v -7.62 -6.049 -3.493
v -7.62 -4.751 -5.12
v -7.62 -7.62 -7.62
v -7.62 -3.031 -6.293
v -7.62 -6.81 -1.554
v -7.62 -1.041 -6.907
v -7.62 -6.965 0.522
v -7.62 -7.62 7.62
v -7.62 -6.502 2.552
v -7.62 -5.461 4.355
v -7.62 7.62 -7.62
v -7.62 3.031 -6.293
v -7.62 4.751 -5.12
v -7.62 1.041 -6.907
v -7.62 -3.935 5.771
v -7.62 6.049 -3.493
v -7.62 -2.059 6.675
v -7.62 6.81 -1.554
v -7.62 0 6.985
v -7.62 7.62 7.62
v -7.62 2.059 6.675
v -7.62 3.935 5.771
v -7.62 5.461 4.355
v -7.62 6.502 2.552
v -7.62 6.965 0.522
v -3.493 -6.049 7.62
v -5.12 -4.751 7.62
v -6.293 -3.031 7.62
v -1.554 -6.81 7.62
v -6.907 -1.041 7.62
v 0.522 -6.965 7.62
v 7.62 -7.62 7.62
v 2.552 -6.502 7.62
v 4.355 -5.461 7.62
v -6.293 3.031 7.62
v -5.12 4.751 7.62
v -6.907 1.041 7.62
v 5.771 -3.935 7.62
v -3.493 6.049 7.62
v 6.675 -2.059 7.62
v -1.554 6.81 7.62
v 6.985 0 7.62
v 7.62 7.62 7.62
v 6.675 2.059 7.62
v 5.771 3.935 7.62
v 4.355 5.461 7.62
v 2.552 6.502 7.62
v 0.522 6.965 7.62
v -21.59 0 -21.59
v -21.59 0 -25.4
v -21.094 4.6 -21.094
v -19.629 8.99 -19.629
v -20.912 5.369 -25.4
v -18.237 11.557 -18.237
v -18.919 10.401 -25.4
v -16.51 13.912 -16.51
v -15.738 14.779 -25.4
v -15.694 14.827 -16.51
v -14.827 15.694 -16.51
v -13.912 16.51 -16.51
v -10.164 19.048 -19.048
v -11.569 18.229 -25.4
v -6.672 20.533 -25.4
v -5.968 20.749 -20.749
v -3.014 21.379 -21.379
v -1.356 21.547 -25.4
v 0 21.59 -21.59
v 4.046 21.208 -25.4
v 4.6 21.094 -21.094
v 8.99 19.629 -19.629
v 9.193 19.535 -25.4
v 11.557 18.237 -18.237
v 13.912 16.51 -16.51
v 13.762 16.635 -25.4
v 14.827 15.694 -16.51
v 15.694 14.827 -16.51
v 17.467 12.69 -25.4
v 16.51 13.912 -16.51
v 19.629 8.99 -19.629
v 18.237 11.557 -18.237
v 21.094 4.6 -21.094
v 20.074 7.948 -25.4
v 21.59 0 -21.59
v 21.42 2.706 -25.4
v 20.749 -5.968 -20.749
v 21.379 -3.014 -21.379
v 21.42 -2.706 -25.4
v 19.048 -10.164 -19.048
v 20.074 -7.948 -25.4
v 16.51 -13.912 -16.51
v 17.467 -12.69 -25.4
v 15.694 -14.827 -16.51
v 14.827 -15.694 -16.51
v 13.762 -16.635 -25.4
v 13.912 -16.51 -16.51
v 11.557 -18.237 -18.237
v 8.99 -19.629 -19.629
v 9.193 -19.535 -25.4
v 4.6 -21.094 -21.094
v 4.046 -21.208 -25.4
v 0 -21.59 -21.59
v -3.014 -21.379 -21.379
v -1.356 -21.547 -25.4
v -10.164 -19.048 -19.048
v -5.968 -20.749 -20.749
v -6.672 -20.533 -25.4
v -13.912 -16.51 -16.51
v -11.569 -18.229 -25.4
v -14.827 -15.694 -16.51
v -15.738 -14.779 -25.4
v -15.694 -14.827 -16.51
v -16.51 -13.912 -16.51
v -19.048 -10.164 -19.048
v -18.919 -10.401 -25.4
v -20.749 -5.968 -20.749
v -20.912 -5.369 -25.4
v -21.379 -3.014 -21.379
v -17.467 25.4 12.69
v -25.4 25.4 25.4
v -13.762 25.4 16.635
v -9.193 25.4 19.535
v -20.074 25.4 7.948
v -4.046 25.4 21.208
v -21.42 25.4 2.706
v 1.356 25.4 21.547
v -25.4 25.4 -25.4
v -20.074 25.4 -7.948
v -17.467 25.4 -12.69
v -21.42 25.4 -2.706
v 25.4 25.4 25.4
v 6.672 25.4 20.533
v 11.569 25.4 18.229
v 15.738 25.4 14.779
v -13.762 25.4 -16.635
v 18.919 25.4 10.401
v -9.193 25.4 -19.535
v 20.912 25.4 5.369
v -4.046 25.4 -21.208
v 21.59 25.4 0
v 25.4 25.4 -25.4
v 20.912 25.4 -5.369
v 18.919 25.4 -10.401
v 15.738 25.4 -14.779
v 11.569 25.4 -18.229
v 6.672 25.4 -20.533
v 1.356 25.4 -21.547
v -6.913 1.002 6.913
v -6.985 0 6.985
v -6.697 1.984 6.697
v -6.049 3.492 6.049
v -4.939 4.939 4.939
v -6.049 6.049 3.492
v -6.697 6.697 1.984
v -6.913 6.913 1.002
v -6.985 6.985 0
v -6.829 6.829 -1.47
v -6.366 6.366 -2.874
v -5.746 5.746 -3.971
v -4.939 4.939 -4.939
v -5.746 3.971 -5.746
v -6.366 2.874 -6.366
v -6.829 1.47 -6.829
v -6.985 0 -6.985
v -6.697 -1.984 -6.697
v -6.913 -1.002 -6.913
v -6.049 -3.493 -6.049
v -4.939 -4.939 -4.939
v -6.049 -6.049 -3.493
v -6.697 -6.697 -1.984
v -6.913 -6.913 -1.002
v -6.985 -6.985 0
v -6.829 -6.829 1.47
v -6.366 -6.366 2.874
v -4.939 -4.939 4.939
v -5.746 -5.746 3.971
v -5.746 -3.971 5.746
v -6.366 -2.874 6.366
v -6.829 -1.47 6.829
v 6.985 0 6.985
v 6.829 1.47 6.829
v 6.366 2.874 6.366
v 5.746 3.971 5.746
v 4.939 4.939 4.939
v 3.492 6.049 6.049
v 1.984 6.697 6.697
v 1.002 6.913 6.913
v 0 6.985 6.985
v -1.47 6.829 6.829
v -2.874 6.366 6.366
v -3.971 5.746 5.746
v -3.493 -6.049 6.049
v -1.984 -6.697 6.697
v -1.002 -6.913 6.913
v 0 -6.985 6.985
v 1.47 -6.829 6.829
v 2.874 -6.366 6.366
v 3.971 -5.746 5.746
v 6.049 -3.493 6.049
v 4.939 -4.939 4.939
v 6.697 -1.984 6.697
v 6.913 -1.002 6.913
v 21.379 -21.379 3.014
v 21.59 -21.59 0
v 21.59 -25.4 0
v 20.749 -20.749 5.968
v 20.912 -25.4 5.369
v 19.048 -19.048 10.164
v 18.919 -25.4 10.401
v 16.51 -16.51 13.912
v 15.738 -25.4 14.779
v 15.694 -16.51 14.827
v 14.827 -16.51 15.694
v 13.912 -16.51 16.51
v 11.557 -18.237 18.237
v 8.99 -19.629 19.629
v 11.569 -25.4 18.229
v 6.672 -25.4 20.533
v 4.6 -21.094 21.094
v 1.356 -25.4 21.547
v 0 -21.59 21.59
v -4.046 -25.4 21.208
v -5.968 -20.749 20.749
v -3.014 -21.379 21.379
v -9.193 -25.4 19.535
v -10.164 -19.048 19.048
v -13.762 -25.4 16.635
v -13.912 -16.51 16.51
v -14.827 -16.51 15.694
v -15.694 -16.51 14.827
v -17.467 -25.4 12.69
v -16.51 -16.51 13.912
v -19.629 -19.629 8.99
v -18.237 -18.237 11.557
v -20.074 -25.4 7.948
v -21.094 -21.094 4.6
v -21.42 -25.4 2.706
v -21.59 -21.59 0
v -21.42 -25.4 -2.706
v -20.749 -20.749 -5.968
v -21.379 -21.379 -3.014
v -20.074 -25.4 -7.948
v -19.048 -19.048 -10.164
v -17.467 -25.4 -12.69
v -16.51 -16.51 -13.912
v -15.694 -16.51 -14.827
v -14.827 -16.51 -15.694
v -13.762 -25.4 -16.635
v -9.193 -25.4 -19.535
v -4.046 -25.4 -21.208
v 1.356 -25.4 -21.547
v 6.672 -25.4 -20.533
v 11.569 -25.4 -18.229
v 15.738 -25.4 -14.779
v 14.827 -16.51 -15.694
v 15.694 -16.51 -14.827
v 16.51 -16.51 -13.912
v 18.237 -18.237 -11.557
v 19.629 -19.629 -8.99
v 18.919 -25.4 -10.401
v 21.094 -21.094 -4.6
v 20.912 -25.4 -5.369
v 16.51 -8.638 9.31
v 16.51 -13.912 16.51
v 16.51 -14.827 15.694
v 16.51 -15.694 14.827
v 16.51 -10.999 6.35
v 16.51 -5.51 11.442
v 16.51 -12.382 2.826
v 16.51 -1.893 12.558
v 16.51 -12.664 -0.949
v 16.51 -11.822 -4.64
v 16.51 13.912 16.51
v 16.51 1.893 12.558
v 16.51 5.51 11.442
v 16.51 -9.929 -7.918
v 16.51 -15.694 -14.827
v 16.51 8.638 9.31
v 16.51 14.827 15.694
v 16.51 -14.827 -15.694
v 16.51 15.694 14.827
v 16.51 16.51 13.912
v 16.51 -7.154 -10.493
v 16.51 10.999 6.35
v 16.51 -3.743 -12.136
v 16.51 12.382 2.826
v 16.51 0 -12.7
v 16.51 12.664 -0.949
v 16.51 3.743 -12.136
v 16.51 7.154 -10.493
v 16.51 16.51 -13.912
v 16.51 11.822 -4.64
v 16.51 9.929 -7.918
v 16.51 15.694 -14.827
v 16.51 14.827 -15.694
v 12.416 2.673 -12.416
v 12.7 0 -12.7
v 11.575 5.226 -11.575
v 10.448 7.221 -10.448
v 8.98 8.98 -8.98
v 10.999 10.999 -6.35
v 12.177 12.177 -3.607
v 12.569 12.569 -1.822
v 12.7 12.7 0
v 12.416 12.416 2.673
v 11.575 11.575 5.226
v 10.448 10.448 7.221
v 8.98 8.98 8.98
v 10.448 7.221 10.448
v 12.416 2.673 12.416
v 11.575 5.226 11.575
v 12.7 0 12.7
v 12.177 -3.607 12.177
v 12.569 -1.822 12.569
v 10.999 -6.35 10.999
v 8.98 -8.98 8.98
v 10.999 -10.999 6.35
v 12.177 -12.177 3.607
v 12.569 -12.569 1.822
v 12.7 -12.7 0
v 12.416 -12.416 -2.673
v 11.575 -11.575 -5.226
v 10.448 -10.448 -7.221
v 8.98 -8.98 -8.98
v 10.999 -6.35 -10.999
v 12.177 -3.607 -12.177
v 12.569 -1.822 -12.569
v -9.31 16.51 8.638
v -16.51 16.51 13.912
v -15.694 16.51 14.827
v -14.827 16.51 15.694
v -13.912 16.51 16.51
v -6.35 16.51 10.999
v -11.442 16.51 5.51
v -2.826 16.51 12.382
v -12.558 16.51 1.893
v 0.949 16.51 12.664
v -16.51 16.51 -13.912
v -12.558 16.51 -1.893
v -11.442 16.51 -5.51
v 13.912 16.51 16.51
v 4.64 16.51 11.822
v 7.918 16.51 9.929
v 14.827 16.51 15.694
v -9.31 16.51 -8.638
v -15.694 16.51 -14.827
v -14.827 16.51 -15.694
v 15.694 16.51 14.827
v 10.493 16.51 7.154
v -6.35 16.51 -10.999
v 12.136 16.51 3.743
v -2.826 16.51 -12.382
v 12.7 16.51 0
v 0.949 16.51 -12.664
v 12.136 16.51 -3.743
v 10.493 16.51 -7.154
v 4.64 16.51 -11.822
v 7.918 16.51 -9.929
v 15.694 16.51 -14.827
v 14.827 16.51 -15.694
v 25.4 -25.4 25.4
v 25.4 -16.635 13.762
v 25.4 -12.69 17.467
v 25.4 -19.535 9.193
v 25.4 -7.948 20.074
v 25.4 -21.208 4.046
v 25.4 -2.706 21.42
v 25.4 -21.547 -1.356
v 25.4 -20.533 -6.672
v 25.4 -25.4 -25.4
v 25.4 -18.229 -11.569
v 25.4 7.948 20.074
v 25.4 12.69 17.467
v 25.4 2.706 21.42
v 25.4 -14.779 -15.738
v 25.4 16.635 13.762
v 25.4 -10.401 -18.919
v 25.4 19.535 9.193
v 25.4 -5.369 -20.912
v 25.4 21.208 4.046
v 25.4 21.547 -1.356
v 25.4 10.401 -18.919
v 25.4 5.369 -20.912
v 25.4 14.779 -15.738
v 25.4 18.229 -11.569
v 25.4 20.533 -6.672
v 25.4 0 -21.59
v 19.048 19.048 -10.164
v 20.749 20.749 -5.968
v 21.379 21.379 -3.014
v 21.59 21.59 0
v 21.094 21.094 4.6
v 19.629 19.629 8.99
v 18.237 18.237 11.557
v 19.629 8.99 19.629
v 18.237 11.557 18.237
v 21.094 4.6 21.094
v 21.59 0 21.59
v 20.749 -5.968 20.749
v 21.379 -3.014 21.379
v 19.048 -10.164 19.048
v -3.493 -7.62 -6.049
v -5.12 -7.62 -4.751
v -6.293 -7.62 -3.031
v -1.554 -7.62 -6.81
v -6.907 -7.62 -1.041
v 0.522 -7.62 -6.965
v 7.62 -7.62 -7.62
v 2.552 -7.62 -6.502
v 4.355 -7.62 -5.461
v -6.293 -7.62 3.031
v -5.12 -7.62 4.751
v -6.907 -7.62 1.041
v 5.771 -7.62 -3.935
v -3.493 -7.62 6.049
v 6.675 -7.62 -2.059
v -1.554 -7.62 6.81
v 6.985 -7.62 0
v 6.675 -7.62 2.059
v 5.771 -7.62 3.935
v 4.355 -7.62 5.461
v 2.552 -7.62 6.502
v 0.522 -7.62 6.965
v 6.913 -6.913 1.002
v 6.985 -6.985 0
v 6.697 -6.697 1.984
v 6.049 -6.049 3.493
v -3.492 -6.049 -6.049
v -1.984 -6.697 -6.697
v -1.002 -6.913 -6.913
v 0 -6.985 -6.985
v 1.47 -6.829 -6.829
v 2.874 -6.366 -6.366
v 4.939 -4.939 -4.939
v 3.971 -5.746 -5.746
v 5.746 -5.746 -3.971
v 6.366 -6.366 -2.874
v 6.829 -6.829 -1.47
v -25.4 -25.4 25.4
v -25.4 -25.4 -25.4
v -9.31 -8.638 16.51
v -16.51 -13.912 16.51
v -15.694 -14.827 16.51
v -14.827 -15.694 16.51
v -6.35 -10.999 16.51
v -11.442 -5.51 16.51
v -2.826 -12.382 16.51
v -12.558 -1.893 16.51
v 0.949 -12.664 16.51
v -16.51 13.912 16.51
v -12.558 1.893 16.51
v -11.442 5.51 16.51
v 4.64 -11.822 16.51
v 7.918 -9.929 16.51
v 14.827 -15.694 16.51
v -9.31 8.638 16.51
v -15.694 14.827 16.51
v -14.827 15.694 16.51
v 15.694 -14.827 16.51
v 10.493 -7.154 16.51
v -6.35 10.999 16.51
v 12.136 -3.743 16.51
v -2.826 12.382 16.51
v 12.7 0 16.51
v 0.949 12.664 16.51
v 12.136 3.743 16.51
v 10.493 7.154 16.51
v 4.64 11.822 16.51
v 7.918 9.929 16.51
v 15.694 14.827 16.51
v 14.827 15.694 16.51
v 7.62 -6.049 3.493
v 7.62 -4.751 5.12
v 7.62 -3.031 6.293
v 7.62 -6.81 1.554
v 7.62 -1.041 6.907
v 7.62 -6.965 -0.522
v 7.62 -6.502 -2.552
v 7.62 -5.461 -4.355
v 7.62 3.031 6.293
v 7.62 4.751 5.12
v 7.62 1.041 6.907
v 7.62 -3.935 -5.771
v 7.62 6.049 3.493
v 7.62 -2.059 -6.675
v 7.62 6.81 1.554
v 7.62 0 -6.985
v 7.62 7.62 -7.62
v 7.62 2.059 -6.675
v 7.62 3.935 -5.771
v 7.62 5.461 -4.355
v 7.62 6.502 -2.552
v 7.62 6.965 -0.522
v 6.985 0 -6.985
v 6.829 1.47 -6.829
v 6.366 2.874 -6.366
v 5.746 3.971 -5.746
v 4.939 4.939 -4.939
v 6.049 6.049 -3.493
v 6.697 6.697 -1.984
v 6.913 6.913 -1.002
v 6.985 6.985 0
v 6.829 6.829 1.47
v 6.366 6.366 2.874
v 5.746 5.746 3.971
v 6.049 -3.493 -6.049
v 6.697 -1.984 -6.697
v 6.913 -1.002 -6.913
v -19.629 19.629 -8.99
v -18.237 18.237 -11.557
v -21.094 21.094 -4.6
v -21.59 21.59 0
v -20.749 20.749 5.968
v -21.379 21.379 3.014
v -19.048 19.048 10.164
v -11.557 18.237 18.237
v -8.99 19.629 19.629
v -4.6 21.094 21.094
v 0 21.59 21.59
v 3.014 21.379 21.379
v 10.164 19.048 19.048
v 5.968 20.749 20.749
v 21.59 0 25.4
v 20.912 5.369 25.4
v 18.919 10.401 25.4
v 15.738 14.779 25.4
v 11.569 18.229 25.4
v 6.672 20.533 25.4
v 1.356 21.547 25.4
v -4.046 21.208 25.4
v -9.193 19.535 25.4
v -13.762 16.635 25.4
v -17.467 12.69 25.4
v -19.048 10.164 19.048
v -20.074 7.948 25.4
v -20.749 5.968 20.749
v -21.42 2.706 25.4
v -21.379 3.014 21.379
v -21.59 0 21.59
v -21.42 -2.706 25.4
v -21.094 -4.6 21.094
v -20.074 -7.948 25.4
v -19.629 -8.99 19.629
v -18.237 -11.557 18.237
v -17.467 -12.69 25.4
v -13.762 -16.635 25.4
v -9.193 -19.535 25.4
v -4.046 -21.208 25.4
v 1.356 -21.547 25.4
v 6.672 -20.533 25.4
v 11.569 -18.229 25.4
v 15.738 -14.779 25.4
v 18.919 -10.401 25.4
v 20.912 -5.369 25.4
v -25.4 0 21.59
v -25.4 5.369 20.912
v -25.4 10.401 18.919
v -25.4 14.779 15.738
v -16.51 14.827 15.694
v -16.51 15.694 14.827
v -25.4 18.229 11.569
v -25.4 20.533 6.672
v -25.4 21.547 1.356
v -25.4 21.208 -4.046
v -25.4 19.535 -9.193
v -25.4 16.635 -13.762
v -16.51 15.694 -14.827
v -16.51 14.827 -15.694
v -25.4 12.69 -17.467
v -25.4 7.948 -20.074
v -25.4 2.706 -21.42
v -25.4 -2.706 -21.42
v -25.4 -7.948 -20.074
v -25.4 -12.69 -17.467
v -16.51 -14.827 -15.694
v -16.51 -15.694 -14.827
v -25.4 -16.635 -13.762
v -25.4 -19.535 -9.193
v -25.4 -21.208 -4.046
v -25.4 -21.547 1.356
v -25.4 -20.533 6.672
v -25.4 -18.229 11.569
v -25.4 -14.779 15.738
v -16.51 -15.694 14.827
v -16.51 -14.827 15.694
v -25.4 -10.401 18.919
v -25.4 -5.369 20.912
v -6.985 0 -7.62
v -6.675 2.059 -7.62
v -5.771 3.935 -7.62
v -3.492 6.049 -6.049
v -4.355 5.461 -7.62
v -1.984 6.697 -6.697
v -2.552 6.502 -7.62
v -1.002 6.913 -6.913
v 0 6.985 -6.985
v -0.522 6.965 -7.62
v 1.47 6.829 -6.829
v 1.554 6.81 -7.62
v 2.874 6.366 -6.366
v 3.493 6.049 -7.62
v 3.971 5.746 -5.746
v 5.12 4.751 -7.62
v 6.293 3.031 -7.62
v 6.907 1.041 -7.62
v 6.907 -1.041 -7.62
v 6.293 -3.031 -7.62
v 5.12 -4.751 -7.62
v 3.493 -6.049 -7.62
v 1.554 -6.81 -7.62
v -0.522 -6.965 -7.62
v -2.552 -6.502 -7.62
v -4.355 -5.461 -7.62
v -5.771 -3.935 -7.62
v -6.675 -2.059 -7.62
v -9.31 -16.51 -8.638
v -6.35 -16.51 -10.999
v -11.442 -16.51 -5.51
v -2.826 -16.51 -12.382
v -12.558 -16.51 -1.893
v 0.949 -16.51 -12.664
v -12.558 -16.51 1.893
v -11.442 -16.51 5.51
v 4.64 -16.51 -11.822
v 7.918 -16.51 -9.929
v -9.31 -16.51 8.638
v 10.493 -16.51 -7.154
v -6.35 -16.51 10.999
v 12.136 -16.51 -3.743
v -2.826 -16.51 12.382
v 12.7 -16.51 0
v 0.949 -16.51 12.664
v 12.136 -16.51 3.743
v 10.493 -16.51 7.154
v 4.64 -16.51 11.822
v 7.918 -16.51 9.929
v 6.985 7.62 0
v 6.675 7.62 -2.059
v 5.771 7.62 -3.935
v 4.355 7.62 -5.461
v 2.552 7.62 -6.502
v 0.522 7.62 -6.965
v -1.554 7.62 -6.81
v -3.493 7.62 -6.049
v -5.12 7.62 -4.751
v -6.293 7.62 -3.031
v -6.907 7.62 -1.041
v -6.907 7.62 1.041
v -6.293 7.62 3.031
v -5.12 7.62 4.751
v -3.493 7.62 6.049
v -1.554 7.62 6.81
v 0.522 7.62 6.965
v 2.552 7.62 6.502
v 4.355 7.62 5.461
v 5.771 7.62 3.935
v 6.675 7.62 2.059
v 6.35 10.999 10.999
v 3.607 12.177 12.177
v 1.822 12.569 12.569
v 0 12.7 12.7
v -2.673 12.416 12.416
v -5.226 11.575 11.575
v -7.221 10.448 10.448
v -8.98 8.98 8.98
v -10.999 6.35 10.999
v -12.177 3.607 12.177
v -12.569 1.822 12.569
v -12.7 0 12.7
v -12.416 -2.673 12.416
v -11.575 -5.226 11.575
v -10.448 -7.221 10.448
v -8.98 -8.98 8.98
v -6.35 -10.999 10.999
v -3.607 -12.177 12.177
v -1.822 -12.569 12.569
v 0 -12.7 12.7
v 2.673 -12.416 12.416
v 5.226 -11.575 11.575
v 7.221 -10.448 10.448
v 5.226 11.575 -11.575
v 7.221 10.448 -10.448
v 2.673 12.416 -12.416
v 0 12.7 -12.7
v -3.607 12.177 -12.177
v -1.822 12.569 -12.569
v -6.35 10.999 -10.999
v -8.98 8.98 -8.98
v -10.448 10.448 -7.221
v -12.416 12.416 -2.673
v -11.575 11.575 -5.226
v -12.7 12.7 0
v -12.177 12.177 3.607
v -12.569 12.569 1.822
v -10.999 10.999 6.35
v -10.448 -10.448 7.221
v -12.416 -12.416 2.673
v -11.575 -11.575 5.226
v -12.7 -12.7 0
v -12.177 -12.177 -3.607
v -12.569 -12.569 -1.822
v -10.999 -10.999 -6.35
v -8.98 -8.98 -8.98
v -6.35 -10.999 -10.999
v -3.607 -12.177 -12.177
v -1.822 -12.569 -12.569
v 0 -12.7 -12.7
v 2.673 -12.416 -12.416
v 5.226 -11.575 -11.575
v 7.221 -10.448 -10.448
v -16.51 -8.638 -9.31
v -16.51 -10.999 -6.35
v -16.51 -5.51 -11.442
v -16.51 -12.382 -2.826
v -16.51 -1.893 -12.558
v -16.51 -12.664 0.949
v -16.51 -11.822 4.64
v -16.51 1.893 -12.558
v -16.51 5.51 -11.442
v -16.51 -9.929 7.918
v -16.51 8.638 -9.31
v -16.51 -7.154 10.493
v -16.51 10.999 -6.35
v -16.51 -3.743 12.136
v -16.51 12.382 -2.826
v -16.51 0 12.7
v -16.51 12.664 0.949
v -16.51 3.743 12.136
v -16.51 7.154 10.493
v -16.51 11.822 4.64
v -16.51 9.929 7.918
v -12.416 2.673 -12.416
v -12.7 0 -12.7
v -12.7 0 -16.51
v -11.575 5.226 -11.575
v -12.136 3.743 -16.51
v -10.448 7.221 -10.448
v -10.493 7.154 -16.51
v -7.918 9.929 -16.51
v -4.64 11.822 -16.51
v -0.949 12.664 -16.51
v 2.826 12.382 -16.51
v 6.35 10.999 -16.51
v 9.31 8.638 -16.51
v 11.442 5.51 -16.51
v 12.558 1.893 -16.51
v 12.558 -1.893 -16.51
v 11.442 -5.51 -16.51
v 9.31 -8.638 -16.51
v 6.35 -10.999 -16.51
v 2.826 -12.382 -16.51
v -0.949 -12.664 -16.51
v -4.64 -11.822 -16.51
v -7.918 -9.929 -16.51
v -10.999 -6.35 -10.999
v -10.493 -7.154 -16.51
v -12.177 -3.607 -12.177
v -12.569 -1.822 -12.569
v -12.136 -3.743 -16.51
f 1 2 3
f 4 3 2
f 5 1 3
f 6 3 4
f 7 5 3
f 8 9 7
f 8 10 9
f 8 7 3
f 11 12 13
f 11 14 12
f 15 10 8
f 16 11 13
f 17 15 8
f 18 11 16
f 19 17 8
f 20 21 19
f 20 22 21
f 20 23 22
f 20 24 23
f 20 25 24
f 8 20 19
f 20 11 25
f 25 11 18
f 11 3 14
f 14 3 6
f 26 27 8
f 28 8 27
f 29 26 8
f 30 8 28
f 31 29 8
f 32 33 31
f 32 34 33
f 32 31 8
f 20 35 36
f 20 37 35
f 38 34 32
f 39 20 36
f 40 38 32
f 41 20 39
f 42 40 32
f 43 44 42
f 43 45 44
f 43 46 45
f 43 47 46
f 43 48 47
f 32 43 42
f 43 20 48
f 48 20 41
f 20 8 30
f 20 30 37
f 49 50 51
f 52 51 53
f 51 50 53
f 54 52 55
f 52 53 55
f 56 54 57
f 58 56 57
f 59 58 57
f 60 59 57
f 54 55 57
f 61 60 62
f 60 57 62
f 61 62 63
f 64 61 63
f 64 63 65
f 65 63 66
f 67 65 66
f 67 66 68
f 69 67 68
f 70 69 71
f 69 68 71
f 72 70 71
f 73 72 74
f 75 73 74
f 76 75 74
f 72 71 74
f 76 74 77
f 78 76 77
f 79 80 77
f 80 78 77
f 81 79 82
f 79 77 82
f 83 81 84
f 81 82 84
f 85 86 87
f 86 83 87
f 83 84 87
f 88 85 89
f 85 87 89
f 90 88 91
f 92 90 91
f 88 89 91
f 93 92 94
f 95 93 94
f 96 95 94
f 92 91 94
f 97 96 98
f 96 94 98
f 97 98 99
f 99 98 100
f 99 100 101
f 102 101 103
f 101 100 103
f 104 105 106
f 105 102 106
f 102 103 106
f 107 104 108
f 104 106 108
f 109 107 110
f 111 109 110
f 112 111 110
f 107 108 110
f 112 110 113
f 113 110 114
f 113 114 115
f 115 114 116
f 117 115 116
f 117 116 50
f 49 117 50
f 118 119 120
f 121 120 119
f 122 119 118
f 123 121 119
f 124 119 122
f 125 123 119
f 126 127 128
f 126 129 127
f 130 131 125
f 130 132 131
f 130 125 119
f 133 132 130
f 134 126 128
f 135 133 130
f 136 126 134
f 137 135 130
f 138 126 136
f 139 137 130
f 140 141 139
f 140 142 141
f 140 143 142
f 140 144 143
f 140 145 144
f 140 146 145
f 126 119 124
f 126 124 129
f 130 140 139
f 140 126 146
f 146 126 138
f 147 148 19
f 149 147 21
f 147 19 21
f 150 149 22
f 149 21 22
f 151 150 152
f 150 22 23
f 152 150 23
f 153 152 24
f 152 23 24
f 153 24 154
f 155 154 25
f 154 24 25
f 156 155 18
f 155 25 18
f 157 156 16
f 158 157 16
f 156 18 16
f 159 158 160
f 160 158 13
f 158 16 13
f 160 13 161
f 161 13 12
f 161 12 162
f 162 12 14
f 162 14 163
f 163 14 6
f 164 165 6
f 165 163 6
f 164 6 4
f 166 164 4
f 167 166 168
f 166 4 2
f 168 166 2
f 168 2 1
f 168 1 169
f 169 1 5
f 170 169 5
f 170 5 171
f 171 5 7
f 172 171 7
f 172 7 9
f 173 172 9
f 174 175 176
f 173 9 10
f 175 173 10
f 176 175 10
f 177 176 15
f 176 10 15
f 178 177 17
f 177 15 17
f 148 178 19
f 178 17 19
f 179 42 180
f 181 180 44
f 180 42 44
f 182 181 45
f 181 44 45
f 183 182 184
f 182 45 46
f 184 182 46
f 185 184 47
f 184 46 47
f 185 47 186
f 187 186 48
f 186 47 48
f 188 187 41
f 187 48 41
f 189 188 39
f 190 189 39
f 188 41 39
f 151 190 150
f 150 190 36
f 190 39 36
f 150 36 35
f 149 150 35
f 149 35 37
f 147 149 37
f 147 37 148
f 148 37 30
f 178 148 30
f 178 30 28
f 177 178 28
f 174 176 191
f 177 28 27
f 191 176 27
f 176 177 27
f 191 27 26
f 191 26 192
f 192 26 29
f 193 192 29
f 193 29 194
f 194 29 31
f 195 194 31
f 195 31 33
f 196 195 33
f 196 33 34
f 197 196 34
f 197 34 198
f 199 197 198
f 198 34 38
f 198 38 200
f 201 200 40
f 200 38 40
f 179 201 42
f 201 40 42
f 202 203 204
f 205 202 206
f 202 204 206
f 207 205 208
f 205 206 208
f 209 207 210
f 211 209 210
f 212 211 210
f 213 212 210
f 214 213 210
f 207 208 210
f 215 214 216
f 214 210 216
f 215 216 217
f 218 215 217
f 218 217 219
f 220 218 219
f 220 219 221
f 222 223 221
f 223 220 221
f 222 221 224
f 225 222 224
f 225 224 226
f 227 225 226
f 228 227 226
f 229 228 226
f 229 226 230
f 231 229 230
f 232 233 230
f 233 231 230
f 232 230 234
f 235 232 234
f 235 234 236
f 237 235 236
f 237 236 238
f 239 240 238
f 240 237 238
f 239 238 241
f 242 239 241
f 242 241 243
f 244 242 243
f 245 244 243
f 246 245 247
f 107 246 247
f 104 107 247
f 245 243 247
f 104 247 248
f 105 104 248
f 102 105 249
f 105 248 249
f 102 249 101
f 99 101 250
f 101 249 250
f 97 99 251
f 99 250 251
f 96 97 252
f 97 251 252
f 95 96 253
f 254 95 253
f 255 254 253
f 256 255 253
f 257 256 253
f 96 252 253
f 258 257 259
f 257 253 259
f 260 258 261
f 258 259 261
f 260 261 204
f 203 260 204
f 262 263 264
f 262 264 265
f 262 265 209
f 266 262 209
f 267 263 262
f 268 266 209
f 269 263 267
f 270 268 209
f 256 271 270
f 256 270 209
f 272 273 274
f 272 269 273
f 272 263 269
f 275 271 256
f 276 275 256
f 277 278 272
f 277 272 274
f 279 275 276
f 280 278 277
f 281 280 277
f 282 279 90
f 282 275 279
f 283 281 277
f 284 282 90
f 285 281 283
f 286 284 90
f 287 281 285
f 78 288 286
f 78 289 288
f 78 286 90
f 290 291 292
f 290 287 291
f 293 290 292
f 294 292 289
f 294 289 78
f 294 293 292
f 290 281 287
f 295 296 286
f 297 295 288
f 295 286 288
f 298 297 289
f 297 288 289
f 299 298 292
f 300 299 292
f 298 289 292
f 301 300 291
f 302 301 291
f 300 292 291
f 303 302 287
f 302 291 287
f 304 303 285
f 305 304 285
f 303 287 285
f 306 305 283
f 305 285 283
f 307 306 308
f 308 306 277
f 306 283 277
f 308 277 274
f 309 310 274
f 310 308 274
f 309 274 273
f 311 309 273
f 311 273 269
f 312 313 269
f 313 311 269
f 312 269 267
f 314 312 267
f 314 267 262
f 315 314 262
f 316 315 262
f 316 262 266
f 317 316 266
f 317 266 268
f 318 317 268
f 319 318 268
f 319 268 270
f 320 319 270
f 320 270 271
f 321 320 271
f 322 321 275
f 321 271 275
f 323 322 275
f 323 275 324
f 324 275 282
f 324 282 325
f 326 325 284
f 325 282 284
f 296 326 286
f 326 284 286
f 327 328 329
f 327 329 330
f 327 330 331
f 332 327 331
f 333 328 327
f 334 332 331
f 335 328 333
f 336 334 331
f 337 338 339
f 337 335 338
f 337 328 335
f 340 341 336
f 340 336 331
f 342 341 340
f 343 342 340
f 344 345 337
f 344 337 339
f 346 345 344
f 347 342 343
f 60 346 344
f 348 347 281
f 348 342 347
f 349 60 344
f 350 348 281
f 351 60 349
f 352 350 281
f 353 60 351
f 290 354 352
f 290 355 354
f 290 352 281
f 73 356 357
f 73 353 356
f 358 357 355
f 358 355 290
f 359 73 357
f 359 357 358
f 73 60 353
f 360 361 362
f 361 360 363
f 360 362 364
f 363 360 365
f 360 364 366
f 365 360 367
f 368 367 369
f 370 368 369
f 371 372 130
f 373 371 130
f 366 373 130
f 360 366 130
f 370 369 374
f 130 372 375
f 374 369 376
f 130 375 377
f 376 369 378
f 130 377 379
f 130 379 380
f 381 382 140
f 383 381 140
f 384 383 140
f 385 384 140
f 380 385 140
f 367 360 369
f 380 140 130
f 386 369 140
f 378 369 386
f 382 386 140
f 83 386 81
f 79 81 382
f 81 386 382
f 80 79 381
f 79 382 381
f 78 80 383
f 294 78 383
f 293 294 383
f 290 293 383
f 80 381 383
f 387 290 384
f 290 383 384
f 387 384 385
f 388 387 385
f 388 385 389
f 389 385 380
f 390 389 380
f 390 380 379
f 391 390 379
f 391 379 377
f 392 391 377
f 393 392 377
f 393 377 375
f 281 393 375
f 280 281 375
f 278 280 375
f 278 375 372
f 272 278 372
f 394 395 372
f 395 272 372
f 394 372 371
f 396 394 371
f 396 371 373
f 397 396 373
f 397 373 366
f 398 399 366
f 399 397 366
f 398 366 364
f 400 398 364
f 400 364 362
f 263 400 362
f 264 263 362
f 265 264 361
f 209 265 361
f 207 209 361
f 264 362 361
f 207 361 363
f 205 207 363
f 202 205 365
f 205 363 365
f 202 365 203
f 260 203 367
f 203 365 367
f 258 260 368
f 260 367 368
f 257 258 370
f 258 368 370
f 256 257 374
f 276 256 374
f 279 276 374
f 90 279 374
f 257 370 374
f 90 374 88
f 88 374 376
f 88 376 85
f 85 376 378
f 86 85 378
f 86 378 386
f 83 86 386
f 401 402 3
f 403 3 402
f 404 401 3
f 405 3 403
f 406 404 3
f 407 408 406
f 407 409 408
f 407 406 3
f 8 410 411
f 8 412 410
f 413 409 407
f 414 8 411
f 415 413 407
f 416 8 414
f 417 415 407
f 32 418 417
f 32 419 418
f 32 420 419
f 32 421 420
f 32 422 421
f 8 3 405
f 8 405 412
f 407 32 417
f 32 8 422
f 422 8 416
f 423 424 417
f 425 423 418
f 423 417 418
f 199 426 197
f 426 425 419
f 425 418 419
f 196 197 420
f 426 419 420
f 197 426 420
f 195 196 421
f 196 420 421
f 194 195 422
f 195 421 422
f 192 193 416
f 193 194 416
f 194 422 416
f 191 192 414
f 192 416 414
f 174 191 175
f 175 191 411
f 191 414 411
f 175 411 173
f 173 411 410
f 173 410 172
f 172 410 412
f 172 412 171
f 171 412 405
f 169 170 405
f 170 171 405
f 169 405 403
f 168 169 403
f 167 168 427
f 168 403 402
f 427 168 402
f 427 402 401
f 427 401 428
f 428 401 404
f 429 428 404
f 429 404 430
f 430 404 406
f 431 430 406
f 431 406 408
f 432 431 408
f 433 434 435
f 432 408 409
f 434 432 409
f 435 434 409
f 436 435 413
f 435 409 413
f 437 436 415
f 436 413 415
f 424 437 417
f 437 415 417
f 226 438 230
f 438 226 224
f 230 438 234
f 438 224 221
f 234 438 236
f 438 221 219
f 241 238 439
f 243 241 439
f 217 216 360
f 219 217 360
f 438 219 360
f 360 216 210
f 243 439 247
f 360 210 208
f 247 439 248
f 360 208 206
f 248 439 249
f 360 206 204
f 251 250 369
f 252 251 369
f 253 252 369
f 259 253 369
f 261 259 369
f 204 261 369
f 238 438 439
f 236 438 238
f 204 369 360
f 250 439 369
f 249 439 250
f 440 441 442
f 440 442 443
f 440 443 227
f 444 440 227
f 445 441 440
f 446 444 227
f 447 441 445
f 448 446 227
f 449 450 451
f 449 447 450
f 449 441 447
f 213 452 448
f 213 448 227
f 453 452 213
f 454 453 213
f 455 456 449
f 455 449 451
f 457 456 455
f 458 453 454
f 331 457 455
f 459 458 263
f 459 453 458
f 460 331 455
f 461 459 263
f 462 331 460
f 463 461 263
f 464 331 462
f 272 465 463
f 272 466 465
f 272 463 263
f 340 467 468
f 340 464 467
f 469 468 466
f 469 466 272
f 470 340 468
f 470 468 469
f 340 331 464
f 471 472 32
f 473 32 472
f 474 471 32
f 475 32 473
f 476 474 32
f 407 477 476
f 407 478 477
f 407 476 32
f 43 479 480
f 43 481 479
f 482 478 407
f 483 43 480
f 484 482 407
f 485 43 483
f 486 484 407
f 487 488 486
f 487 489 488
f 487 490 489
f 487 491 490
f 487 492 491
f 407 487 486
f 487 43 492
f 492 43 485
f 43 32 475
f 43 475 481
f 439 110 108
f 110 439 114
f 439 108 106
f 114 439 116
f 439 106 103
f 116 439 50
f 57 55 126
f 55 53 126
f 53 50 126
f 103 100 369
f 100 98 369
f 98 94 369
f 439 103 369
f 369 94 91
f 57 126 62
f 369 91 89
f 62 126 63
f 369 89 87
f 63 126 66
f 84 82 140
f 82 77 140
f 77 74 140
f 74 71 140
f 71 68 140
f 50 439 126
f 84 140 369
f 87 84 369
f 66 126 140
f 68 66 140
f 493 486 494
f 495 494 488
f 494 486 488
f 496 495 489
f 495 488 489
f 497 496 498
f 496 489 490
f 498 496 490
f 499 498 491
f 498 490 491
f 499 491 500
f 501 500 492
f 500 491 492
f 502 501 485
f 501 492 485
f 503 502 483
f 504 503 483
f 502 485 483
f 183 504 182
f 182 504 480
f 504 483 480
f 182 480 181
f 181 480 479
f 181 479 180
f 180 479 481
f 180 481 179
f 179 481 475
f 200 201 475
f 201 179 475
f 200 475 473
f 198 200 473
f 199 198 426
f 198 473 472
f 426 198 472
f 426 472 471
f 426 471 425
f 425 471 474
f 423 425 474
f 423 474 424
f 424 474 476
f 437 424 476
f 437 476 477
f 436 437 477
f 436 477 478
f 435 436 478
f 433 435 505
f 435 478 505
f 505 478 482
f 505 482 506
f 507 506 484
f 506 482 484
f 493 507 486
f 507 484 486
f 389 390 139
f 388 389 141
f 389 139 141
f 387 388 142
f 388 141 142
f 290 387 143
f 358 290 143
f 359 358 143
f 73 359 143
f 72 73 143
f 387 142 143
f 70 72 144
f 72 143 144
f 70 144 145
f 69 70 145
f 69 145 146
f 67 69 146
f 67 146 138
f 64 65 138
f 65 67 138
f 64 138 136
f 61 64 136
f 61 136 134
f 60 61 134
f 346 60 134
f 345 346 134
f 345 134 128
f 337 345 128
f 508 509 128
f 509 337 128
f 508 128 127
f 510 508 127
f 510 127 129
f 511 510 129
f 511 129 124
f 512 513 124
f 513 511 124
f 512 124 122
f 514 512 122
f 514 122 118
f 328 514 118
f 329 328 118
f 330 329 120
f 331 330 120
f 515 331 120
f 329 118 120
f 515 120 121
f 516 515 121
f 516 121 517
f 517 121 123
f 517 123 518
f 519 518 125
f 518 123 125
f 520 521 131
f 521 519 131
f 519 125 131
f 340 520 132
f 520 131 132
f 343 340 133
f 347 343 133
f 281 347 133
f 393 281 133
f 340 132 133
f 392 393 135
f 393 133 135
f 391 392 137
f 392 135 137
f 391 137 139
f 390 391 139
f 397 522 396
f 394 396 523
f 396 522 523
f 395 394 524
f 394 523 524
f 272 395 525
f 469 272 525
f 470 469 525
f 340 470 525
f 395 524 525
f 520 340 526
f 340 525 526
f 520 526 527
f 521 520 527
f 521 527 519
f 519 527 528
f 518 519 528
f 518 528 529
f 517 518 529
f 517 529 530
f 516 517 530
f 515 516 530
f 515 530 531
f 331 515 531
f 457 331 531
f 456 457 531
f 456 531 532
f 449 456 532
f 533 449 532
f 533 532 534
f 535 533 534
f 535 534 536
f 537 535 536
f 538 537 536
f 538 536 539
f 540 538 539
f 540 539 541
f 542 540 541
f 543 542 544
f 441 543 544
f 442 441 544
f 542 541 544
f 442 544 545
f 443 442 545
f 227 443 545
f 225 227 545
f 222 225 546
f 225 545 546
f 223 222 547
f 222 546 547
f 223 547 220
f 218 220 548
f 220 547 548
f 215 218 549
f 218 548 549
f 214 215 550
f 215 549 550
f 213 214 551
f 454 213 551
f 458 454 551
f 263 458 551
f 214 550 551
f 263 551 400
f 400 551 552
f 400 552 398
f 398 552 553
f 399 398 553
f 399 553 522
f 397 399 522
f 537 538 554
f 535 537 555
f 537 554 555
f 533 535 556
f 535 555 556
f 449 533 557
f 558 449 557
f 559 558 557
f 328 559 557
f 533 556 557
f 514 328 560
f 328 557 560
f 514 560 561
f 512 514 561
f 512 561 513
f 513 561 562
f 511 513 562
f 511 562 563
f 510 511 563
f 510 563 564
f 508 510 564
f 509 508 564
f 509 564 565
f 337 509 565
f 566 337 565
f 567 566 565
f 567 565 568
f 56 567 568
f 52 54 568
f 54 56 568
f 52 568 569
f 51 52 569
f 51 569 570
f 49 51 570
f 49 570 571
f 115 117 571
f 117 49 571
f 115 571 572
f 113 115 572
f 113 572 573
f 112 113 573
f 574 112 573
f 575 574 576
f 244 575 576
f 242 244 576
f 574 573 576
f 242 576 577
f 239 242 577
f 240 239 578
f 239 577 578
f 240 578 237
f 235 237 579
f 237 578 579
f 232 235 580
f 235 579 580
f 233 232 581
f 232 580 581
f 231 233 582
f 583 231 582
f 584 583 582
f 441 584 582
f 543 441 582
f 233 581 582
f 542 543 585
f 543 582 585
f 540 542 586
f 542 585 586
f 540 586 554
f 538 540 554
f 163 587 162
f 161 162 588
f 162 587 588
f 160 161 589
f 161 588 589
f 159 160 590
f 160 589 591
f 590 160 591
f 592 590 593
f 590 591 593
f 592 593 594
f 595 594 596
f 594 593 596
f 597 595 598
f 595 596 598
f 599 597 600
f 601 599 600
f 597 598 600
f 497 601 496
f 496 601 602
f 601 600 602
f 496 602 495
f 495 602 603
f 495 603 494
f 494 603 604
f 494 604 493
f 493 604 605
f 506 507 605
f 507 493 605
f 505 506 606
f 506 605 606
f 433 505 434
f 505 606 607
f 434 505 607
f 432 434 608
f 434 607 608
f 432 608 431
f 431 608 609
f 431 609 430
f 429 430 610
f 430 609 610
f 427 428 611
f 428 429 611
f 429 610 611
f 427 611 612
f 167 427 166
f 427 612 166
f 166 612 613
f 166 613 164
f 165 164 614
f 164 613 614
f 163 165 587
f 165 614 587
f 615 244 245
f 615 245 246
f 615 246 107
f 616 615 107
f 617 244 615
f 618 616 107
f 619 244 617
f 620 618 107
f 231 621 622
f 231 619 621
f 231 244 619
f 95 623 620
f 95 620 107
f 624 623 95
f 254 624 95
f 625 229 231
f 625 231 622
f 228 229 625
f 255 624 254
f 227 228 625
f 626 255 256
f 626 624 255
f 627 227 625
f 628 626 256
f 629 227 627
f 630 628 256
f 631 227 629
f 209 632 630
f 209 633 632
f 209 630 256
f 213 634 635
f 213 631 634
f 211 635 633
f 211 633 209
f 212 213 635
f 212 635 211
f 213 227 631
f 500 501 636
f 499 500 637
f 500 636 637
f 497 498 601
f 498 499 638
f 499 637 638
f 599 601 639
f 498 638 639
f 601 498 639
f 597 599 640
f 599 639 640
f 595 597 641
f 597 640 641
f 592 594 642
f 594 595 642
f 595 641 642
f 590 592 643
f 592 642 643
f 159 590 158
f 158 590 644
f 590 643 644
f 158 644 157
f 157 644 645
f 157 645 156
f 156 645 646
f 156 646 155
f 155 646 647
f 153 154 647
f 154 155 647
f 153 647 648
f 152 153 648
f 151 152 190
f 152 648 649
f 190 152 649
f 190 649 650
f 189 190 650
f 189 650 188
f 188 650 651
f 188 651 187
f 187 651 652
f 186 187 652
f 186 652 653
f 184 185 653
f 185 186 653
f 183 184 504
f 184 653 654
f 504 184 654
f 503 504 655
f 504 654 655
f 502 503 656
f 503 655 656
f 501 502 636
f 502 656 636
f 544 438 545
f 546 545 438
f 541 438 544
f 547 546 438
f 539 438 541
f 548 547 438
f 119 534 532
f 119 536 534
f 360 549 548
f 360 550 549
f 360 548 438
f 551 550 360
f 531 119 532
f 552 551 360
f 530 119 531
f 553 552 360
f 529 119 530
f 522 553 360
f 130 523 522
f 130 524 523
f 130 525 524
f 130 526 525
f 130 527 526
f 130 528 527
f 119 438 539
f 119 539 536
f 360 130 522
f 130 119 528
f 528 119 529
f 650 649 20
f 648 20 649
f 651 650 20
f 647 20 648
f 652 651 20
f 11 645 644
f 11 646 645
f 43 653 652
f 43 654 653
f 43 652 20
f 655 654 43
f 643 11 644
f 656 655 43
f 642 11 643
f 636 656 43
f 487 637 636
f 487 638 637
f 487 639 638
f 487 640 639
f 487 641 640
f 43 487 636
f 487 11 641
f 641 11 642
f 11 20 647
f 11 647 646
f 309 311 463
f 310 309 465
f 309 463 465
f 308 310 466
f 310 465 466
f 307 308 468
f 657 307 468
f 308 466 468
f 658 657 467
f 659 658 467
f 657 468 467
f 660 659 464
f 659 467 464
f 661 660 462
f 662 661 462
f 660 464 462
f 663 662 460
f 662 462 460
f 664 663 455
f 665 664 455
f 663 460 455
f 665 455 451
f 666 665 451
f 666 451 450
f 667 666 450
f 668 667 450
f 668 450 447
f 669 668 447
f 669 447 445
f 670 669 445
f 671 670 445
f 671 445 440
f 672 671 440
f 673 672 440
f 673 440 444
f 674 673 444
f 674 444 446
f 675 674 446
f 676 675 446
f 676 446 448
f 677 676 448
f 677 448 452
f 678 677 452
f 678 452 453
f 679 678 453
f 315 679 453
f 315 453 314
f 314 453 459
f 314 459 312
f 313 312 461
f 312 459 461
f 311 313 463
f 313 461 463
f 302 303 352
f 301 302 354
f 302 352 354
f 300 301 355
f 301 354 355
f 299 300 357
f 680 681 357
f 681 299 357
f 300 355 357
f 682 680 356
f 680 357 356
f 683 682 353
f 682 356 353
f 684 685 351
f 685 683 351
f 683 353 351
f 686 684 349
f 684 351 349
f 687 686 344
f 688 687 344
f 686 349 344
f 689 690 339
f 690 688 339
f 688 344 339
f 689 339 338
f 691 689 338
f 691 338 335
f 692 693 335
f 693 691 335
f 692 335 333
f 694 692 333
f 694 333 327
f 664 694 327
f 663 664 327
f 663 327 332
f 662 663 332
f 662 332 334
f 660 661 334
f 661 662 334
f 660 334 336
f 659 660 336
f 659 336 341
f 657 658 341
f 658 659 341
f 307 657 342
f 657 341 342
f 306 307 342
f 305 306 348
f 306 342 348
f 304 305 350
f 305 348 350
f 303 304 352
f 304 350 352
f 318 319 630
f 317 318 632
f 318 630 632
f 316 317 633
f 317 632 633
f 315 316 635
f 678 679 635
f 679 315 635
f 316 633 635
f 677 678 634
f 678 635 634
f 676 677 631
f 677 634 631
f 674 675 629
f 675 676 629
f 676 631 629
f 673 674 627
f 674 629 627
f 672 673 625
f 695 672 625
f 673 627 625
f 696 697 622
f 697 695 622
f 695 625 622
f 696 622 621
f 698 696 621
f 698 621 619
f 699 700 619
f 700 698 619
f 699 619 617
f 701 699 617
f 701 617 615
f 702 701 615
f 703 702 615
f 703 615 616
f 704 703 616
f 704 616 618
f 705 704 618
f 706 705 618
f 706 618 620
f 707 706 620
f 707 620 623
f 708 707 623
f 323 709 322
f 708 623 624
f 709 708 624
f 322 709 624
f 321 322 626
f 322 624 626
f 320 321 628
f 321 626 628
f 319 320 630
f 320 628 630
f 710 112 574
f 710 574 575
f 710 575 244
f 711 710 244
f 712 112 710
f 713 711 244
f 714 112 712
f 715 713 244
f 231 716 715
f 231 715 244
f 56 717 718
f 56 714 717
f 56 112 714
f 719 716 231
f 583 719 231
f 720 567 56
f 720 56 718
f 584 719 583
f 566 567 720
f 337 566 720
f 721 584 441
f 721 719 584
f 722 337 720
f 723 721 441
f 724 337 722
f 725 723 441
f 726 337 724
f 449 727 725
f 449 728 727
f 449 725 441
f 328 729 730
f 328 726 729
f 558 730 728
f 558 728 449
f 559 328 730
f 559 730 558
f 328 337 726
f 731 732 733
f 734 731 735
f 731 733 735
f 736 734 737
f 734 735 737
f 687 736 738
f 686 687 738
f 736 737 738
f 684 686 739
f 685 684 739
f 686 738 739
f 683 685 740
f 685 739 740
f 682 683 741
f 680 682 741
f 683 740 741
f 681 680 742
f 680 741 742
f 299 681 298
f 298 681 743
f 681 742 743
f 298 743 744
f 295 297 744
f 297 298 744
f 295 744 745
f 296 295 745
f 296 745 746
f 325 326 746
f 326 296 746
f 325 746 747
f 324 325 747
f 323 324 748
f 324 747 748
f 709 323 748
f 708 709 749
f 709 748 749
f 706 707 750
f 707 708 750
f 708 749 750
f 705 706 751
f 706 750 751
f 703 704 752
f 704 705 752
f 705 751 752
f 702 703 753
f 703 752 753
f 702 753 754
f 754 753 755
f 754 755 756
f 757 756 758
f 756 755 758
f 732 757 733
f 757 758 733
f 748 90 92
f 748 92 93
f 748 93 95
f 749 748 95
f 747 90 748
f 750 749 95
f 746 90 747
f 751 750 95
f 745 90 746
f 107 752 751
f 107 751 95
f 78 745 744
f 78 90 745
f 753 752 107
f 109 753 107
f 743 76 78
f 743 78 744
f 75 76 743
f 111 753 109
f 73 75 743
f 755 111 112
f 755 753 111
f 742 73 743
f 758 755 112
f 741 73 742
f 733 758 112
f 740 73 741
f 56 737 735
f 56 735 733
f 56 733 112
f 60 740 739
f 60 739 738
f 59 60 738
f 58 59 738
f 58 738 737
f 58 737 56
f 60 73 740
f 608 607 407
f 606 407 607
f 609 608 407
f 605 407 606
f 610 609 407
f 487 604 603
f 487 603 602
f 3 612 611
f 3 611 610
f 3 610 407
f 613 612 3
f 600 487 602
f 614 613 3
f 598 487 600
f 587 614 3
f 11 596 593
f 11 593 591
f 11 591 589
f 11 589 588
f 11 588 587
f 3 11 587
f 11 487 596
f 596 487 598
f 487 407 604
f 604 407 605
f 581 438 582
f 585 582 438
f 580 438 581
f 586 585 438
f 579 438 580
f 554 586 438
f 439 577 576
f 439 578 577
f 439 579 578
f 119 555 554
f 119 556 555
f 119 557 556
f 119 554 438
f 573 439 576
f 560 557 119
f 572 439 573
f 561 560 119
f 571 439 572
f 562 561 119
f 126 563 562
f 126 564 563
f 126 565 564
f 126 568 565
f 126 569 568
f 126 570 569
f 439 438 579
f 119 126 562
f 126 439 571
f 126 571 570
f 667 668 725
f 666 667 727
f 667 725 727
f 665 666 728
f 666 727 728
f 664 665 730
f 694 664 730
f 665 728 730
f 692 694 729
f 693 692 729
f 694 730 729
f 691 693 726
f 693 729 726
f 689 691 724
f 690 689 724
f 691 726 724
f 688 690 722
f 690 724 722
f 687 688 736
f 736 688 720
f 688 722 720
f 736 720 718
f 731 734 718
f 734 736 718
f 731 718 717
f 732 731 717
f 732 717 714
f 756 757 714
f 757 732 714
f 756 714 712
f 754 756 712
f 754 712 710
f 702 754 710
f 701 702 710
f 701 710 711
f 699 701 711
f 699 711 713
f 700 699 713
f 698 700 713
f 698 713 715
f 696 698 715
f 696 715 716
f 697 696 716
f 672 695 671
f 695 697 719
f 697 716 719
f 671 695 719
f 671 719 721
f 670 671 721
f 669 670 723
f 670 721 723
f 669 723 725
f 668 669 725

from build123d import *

# Parameters (mm, degrees)
BOSS_EXTRUDE1_DEPTH      = 25.4
BOSS_EXTRUDE1_DEPTH_BACK = 25.4
SKETCH3_W                = 50.8
SKETCH3_H                = 50.8
SKETCH4_R                = 21.59
CUT_EXTRUDE1_DEPTH       = 8.89
SKETCH5_R                = 12.7
CUT_EXTRUDE2_DEPTH       = 17.78
SKETCH6_R                = 6.985
CUT_EXTRUDE3_DEPTH       = 25.4
CIRPATTERN1_COUNT        = 4
CIRPATTERN6_COUNT        = 4


with BuildPart() as part:
    # Sketch3 → Boss-Extrude1 (new, two sides: drawn at the far end of the back side and taken through both)
    with BuildSketch(Plane.XY.offset(-BOSS_EXTRUDE1_DEPTH_BACK)):
        Rectangle(SKETCH3_W, SKETCH3_H)
    extrude(amount=BOSS_EXTRUDE1_DEPTH + BOSS_EXTRUDE1_DEPTH_BACK)

    # Sketch4 → Cut-Extrude1 (cut)
    with BuildSketch(Plane.XY.offset(25.4)):
        Circle(SKETCH4_R)
    cut_extrude1 = extrude(amount=-CUT_EXTRUDE1_DEPTH, mode=Mode.SUBTRACT)

    # Sketch5 → Cut-Extrude2 (cut)
    with BuildSketch(Plane.XY.offset(25.4)):
        Circle(SKETCH5_R)
    cut_extrude2 = extrude(amount=-CUT_EXTRUDE2_DEPTH, mode=Mode.SUBTRACT)

    # Sketch6 → Cut-Extrude3 (cut)
    with BuildSketch(Plane.XY.offset(25.4)):
        Circle(SKETCH6_R)
    cut_extrude3 = extrude(amount=-CUT_EXTRUDE3_DEPTH, mode=Mode.SUBTRACT)

    # CirPattern1: Cut-Extrude1, Cut-Extrude2, Cut-Extrude3 ×4 about axis
    cirpattern1_axis = Axis((0, 0, 0), (0, 1, 0))
    add([cut_extrude1.rotate(cirpattern1_axis, i * 360 / CIRPATTERN1_COUNT) for i in range(1, CIRPATTERN1_COUNT)], mode=Mode.SUBTRACT)
    add([cut_extrude2.rotate(cirpattern1_axis, i * 360 / CIRPATTERN1_COUNT) for i in range(1, CIRPATTERN1_COUNT)], mode=Mode.SUBTRACT)
    add([cut_extrude3.rotate(cirpattern1_axis, i * 360 / CIRPATTERN1_COUNT) for i in range(1, CIRPATTERN1_COUNT)], mode=Mode.SUBTRACT)

    # CirPattern6: Cut-Extrude1, Cut-Extrude2, Cut-Extrude3 ×4 about axis
    cirpattern6_axis = Axis((0, 0, 0), (1, 0, 0))
    add([cut_extrude1.rotate(cirpattern6_axis, i * 360 / CIRPATTERN6_COUNT) for i in range(1, CIRPATTERN6_COUNT)], mode=Mode.SUBTRACT)
    add([cut_extrude2.rotate(cirpattern6_axis, i * 360 / CIRPATTERN6_COUNT) for i in range(1, CIRPATTERN6_COUNT)], mode=Mode.SUBTRACT)
    add([cut_extrude3.rotate(cirpattern6_axis, i * 360 / CIRPATTERN6_COUNT) for i in range(1, CIRPATTERN6_COUNT)], mode=Mode.SUBTRACT)


solid = part.part
